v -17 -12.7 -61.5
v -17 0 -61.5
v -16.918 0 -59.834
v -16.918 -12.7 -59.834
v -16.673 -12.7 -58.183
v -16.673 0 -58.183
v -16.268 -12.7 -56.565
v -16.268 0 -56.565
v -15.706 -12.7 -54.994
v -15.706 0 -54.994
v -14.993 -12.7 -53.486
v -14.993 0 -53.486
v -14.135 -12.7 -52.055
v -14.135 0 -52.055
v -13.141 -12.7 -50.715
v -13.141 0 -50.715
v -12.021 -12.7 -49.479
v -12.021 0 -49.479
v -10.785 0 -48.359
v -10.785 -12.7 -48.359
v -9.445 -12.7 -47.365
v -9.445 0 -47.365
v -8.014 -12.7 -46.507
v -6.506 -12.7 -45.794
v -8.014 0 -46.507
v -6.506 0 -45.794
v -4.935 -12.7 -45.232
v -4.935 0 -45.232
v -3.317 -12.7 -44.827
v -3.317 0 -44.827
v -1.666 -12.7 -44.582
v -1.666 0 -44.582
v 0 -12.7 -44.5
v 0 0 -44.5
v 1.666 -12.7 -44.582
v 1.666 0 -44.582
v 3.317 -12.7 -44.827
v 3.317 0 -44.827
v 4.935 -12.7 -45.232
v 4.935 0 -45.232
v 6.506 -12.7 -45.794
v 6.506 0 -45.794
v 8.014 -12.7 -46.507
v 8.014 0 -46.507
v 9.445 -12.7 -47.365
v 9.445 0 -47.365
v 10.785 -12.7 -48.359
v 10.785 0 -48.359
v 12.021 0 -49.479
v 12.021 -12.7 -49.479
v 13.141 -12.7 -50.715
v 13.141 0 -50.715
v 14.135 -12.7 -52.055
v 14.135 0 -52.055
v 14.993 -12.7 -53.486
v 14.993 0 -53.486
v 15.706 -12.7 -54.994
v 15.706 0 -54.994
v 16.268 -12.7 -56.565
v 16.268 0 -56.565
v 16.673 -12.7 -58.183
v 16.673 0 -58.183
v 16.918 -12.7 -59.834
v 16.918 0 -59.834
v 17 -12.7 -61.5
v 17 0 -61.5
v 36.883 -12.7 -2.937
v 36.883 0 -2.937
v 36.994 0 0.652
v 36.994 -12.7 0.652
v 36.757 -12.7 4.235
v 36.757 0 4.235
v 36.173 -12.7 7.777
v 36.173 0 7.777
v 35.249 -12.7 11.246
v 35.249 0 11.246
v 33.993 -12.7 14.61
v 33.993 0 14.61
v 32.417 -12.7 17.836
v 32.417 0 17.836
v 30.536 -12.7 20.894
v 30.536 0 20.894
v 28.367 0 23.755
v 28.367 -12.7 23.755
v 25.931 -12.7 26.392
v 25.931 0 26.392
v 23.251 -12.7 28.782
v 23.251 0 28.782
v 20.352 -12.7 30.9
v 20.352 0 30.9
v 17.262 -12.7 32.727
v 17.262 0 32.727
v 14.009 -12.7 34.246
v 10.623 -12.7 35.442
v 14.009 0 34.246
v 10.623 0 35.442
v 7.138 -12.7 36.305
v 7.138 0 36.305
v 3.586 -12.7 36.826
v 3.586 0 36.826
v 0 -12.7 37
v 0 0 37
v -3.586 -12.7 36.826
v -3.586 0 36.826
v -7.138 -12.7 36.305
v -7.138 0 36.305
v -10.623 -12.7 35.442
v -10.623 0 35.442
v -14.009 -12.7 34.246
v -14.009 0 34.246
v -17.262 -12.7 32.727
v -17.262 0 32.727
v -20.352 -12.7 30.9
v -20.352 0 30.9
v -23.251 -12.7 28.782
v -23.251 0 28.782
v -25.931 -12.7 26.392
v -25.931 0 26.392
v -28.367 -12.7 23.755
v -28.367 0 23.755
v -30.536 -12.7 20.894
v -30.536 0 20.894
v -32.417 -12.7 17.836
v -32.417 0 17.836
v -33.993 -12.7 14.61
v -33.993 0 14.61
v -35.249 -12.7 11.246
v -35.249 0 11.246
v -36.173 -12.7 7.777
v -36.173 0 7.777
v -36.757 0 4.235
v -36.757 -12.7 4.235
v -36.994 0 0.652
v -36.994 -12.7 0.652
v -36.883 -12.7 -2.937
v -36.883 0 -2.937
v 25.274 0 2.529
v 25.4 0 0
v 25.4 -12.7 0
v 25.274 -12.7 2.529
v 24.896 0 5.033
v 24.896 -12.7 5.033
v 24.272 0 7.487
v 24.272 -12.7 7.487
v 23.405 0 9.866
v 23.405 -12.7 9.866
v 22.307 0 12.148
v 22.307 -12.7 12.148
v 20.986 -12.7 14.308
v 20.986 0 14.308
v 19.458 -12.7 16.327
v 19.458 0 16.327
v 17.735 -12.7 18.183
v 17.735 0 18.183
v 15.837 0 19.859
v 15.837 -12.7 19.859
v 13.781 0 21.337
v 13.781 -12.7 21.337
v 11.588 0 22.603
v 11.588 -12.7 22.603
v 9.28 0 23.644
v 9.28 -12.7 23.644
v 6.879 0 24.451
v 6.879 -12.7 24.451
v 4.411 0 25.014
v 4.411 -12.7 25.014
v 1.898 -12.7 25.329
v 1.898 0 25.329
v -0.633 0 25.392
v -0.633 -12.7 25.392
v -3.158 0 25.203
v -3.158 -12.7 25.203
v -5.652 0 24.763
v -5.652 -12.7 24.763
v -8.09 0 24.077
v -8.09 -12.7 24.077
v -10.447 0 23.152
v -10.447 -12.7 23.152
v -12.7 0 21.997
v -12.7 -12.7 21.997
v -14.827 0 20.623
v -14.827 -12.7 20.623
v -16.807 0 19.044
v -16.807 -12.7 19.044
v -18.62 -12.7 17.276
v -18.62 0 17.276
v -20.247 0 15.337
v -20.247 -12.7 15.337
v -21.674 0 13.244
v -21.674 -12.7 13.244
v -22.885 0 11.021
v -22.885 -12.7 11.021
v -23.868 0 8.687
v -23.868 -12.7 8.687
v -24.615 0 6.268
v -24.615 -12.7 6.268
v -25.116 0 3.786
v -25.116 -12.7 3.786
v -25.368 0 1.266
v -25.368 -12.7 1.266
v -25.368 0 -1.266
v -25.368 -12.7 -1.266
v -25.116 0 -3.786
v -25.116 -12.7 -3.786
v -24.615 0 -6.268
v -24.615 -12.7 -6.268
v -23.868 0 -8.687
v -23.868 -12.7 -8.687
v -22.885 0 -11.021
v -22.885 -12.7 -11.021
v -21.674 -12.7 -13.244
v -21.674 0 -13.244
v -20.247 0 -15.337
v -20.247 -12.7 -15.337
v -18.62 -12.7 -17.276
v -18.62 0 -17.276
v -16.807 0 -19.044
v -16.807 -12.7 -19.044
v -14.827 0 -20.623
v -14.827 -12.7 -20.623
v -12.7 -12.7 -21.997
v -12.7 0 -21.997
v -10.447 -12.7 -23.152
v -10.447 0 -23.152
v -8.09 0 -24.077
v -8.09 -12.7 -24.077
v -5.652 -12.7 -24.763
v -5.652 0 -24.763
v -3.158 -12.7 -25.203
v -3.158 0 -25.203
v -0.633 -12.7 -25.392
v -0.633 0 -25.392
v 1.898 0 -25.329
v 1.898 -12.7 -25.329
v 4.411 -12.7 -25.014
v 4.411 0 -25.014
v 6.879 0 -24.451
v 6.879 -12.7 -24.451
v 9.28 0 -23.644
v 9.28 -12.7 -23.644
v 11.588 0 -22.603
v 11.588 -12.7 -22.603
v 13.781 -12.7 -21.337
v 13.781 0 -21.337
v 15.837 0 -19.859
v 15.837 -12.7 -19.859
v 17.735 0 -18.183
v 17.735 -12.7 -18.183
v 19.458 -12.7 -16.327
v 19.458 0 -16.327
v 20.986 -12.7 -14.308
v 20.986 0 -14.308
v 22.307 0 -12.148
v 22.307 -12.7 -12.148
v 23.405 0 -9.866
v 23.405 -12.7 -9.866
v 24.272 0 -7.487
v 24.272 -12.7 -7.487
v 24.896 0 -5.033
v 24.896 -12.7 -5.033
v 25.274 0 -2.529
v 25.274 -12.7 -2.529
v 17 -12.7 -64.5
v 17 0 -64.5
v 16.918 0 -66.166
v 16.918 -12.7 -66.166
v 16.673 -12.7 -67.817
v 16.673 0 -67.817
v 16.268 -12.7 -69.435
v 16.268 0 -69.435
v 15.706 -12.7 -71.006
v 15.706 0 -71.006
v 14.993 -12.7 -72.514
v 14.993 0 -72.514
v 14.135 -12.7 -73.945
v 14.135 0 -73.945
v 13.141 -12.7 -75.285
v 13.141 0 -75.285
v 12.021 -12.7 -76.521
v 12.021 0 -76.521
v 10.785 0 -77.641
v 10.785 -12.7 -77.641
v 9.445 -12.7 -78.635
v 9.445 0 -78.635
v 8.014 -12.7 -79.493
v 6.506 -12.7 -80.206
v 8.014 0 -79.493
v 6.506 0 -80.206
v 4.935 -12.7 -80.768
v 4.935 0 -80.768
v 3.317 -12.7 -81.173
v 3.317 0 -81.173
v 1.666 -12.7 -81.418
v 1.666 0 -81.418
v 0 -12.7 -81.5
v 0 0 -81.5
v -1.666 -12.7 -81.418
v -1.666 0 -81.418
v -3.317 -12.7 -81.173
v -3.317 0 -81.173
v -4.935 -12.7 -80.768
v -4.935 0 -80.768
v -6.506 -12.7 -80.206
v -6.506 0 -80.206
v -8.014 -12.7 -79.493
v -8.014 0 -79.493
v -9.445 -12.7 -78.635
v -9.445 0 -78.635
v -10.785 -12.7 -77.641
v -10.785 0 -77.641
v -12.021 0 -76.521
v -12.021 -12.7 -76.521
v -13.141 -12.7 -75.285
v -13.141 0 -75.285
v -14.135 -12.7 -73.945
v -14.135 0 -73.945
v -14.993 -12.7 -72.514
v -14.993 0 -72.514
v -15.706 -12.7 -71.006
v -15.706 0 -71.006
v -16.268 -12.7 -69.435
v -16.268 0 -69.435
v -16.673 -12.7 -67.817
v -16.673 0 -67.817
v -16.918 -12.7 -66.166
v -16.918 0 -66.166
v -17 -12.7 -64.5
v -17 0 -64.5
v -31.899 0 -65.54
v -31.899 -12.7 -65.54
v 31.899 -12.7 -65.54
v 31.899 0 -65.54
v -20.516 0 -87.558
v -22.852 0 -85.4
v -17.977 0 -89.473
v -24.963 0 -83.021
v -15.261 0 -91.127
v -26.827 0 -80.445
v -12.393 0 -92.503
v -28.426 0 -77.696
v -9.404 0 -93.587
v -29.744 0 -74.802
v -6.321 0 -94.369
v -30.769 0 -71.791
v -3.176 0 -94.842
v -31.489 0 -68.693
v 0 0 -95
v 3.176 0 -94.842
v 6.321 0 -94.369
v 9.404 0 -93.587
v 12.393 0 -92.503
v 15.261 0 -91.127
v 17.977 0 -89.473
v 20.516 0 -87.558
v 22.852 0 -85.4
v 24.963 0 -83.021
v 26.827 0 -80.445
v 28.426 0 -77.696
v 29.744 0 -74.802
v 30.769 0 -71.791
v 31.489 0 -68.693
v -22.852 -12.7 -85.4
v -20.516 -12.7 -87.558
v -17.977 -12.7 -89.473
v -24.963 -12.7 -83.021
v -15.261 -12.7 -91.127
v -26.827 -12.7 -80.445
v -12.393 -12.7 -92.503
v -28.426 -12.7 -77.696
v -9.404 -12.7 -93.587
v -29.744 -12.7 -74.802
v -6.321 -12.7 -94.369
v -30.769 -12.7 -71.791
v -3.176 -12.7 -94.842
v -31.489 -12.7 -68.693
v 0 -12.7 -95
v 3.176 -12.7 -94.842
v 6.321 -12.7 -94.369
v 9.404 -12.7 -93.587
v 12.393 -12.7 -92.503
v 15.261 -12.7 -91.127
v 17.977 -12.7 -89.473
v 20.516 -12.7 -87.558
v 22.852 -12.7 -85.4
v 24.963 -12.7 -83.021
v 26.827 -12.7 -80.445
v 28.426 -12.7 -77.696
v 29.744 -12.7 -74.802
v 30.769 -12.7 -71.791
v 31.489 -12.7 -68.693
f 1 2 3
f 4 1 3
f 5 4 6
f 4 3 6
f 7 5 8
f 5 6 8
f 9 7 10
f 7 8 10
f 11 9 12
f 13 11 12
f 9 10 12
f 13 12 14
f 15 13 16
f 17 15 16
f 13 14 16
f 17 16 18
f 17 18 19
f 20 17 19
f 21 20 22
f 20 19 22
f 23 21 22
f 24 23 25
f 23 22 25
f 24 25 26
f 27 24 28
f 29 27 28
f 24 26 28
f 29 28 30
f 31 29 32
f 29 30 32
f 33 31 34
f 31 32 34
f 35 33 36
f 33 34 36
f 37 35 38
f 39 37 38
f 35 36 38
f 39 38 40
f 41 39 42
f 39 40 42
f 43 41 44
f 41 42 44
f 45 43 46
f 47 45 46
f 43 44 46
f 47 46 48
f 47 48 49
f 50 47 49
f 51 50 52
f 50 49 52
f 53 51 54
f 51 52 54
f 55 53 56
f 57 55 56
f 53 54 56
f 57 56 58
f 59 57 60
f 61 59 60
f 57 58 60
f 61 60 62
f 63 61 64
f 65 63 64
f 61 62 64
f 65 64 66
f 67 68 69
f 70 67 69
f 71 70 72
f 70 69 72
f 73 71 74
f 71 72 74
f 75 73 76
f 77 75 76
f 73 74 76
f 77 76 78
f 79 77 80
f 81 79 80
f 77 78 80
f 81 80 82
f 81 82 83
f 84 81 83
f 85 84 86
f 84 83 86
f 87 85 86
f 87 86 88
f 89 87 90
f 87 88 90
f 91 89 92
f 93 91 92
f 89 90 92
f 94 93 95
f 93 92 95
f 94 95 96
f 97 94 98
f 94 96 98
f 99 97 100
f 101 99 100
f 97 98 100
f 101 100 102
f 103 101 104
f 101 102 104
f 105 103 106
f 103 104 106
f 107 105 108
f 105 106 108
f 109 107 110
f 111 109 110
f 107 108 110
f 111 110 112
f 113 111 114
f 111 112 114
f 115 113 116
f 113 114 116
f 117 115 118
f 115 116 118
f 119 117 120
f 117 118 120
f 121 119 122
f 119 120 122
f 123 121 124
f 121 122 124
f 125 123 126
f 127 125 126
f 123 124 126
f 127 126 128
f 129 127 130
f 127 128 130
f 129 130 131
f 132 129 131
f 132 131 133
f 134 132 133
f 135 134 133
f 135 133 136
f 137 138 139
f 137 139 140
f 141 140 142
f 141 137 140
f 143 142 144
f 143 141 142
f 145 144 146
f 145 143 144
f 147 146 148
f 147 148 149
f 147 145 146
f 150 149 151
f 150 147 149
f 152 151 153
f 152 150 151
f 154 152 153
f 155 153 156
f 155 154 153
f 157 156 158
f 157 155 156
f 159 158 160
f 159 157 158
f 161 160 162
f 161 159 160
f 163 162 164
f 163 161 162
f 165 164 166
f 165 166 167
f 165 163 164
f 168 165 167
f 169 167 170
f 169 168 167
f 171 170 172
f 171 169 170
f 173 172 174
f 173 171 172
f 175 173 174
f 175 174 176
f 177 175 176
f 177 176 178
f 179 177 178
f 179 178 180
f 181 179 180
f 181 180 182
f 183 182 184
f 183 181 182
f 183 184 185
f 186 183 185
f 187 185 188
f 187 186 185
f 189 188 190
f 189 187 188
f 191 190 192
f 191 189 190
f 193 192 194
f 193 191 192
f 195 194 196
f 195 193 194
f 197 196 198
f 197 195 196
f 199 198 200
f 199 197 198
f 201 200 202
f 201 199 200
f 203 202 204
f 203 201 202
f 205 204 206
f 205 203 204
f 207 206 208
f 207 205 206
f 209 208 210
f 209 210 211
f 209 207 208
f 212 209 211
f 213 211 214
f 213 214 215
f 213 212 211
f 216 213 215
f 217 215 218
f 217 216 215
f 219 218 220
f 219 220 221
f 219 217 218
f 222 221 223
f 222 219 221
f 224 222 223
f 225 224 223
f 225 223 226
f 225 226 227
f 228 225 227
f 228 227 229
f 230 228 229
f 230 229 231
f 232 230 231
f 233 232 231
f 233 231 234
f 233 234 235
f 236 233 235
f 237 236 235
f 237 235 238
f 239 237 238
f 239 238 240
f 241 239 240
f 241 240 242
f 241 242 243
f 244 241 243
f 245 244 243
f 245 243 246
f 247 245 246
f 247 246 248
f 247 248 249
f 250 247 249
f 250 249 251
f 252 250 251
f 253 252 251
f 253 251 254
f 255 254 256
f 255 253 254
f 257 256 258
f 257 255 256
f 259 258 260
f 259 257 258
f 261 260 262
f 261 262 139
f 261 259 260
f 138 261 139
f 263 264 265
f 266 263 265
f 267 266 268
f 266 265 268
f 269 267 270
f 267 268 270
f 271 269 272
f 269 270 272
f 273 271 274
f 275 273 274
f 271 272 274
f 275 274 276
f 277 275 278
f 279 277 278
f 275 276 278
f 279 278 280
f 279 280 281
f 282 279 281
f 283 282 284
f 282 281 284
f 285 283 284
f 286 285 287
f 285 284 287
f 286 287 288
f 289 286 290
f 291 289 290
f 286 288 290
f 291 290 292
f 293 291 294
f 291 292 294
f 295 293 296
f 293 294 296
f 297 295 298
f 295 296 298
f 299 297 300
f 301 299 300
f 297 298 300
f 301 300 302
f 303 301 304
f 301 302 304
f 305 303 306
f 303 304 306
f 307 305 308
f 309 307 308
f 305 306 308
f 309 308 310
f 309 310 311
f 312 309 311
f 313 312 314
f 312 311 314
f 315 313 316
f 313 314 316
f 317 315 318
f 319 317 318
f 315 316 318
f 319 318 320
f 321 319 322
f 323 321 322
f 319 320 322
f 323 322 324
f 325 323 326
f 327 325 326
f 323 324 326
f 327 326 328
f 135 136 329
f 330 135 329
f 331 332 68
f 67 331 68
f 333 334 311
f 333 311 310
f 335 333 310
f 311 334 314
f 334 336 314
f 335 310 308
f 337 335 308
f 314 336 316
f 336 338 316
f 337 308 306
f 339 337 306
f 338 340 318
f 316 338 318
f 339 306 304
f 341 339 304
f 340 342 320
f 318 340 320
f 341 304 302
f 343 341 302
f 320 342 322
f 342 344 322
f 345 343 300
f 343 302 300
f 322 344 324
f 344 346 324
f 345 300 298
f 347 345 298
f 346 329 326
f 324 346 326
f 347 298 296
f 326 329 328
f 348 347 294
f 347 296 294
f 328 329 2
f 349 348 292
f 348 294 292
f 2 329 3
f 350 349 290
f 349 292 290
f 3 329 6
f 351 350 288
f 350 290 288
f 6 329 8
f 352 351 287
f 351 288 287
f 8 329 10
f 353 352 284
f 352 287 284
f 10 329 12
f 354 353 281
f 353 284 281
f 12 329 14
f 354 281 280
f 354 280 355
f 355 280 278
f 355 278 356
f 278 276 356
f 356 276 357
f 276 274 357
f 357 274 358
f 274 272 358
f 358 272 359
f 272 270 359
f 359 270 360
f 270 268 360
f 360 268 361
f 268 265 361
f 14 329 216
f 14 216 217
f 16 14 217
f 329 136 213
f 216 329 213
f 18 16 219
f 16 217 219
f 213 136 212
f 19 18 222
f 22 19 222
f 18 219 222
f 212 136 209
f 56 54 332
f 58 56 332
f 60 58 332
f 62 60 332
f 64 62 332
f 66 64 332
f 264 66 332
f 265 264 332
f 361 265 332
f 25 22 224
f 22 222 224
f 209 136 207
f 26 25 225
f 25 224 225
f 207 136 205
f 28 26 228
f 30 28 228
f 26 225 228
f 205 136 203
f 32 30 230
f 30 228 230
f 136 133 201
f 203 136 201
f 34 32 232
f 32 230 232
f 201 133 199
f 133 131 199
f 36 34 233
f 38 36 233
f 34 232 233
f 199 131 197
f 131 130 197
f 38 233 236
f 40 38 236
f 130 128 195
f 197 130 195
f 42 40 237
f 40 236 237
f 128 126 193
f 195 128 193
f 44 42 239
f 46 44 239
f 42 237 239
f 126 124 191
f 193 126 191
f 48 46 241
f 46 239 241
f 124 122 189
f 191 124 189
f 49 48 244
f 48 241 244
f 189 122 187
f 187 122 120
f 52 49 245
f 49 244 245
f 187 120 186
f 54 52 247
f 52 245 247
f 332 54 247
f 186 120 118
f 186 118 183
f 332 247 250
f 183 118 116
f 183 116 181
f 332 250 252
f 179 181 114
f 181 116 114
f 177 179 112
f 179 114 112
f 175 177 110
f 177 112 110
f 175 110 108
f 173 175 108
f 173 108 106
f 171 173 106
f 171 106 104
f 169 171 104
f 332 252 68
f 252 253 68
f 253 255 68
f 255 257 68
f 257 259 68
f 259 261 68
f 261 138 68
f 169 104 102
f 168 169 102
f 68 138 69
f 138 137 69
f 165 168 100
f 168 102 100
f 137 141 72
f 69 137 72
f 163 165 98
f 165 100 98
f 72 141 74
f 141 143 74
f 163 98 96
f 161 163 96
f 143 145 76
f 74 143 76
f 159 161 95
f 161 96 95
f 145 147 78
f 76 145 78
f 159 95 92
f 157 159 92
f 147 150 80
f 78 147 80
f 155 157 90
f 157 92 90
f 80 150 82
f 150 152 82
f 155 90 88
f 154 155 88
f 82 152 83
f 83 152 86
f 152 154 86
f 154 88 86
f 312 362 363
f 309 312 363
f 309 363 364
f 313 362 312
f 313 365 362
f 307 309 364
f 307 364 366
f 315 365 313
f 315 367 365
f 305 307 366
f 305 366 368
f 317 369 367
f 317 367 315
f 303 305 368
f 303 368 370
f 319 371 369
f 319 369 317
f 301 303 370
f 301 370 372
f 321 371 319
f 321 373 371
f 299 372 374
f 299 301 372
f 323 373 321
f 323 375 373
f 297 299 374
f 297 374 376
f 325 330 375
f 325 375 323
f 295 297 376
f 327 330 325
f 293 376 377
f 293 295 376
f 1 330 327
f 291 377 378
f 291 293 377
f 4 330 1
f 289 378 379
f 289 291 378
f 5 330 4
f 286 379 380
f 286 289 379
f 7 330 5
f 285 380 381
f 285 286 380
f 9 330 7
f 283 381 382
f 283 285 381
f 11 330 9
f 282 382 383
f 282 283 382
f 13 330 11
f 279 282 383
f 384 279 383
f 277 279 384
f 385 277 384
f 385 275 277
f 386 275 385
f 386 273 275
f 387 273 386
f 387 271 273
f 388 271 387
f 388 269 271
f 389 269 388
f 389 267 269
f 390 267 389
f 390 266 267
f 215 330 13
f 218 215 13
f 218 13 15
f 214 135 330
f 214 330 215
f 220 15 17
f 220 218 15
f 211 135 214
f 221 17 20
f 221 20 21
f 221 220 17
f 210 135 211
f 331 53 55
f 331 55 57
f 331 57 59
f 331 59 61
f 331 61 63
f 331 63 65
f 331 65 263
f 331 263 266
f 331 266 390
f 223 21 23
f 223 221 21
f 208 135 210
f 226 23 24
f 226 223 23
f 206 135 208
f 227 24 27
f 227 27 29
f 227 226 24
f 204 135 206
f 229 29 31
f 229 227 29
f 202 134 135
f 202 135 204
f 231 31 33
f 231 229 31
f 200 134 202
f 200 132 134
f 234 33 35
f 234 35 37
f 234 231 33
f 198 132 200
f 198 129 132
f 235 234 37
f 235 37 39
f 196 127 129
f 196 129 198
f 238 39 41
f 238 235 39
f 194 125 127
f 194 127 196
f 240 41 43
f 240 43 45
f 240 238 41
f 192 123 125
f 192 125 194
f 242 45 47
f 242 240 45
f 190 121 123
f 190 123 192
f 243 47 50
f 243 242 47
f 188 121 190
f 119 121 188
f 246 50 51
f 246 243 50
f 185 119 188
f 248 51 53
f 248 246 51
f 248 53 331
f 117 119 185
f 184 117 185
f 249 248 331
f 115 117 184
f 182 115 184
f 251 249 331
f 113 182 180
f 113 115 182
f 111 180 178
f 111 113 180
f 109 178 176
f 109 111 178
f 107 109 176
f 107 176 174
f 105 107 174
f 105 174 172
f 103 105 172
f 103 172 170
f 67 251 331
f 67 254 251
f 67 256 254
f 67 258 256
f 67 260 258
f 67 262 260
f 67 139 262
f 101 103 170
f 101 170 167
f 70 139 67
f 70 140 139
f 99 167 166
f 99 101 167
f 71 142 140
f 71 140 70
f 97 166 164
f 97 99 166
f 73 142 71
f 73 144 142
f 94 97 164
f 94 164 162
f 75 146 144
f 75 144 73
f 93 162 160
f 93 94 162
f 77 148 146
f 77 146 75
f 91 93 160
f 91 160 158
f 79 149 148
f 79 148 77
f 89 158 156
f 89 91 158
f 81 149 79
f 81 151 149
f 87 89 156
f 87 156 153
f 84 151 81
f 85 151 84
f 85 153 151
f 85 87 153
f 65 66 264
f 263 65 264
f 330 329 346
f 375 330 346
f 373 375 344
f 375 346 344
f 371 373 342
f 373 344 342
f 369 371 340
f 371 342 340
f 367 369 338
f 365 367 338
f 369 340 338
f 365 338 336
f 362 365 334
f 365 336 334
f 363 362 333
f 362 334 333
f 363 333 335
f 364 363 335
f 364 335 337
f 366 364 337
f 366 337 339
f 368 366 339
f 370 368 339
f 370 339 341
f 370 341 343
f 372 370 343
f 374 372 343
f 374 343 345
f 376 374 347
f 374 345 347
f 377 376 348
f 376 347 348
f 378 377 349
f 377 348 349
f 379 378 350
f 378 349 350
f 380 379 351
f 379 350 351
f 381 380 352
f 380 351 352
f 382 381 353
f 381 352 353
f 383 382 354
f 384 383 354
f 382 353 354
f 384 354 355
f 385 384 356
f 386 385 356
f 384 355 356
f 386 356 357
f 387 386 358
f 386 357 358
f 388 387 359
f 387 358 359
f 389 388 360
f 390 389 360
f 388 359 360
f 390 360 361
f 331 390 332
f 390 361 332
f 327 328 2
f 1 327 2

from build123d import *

# Parameters (mm, degrees)
F0_R     = 25.4
F1_DEPTH = 12.7


with BuildPart() as f1:
    # F0 (on Front) → F1 (new body)
    with BuildSketch(Plane.XZ):
        with BuildLine():
            Line((31.8990597447, -65.5396825397), (36.8832878298, -2.9365079365))
            ThreePointArc((36.8832878298, -2.9365079365), (0, 37), (-36.8832878298, -2.9365079365))
            Line((-36.8832878298, -2.9365079365), (-31.8990597447, -65.5396825397))
            ThreePointArc((-31.8990597447, -65.5396825397), (0, -95), (31.8990597447, -65.5396825397))
        make_face()
        with BuildLine():
            Line((-17, -64.5), (-17, -61.5))
            ThreePointArc((-17, -61.5), (0, -44.5), (17, -61.5))
            Line((17, -61.5), (17, -64.5))
            ThreePointArc((17, -64.5), (0, -81.5), (-17, -64.5))
        make_face(mode=Mode.SUBTRACT)
        Circle(F0_R, mode=Mode.SUBTRACT)
    extrude(amount=F1_DEPTH)


solid = f1.part
